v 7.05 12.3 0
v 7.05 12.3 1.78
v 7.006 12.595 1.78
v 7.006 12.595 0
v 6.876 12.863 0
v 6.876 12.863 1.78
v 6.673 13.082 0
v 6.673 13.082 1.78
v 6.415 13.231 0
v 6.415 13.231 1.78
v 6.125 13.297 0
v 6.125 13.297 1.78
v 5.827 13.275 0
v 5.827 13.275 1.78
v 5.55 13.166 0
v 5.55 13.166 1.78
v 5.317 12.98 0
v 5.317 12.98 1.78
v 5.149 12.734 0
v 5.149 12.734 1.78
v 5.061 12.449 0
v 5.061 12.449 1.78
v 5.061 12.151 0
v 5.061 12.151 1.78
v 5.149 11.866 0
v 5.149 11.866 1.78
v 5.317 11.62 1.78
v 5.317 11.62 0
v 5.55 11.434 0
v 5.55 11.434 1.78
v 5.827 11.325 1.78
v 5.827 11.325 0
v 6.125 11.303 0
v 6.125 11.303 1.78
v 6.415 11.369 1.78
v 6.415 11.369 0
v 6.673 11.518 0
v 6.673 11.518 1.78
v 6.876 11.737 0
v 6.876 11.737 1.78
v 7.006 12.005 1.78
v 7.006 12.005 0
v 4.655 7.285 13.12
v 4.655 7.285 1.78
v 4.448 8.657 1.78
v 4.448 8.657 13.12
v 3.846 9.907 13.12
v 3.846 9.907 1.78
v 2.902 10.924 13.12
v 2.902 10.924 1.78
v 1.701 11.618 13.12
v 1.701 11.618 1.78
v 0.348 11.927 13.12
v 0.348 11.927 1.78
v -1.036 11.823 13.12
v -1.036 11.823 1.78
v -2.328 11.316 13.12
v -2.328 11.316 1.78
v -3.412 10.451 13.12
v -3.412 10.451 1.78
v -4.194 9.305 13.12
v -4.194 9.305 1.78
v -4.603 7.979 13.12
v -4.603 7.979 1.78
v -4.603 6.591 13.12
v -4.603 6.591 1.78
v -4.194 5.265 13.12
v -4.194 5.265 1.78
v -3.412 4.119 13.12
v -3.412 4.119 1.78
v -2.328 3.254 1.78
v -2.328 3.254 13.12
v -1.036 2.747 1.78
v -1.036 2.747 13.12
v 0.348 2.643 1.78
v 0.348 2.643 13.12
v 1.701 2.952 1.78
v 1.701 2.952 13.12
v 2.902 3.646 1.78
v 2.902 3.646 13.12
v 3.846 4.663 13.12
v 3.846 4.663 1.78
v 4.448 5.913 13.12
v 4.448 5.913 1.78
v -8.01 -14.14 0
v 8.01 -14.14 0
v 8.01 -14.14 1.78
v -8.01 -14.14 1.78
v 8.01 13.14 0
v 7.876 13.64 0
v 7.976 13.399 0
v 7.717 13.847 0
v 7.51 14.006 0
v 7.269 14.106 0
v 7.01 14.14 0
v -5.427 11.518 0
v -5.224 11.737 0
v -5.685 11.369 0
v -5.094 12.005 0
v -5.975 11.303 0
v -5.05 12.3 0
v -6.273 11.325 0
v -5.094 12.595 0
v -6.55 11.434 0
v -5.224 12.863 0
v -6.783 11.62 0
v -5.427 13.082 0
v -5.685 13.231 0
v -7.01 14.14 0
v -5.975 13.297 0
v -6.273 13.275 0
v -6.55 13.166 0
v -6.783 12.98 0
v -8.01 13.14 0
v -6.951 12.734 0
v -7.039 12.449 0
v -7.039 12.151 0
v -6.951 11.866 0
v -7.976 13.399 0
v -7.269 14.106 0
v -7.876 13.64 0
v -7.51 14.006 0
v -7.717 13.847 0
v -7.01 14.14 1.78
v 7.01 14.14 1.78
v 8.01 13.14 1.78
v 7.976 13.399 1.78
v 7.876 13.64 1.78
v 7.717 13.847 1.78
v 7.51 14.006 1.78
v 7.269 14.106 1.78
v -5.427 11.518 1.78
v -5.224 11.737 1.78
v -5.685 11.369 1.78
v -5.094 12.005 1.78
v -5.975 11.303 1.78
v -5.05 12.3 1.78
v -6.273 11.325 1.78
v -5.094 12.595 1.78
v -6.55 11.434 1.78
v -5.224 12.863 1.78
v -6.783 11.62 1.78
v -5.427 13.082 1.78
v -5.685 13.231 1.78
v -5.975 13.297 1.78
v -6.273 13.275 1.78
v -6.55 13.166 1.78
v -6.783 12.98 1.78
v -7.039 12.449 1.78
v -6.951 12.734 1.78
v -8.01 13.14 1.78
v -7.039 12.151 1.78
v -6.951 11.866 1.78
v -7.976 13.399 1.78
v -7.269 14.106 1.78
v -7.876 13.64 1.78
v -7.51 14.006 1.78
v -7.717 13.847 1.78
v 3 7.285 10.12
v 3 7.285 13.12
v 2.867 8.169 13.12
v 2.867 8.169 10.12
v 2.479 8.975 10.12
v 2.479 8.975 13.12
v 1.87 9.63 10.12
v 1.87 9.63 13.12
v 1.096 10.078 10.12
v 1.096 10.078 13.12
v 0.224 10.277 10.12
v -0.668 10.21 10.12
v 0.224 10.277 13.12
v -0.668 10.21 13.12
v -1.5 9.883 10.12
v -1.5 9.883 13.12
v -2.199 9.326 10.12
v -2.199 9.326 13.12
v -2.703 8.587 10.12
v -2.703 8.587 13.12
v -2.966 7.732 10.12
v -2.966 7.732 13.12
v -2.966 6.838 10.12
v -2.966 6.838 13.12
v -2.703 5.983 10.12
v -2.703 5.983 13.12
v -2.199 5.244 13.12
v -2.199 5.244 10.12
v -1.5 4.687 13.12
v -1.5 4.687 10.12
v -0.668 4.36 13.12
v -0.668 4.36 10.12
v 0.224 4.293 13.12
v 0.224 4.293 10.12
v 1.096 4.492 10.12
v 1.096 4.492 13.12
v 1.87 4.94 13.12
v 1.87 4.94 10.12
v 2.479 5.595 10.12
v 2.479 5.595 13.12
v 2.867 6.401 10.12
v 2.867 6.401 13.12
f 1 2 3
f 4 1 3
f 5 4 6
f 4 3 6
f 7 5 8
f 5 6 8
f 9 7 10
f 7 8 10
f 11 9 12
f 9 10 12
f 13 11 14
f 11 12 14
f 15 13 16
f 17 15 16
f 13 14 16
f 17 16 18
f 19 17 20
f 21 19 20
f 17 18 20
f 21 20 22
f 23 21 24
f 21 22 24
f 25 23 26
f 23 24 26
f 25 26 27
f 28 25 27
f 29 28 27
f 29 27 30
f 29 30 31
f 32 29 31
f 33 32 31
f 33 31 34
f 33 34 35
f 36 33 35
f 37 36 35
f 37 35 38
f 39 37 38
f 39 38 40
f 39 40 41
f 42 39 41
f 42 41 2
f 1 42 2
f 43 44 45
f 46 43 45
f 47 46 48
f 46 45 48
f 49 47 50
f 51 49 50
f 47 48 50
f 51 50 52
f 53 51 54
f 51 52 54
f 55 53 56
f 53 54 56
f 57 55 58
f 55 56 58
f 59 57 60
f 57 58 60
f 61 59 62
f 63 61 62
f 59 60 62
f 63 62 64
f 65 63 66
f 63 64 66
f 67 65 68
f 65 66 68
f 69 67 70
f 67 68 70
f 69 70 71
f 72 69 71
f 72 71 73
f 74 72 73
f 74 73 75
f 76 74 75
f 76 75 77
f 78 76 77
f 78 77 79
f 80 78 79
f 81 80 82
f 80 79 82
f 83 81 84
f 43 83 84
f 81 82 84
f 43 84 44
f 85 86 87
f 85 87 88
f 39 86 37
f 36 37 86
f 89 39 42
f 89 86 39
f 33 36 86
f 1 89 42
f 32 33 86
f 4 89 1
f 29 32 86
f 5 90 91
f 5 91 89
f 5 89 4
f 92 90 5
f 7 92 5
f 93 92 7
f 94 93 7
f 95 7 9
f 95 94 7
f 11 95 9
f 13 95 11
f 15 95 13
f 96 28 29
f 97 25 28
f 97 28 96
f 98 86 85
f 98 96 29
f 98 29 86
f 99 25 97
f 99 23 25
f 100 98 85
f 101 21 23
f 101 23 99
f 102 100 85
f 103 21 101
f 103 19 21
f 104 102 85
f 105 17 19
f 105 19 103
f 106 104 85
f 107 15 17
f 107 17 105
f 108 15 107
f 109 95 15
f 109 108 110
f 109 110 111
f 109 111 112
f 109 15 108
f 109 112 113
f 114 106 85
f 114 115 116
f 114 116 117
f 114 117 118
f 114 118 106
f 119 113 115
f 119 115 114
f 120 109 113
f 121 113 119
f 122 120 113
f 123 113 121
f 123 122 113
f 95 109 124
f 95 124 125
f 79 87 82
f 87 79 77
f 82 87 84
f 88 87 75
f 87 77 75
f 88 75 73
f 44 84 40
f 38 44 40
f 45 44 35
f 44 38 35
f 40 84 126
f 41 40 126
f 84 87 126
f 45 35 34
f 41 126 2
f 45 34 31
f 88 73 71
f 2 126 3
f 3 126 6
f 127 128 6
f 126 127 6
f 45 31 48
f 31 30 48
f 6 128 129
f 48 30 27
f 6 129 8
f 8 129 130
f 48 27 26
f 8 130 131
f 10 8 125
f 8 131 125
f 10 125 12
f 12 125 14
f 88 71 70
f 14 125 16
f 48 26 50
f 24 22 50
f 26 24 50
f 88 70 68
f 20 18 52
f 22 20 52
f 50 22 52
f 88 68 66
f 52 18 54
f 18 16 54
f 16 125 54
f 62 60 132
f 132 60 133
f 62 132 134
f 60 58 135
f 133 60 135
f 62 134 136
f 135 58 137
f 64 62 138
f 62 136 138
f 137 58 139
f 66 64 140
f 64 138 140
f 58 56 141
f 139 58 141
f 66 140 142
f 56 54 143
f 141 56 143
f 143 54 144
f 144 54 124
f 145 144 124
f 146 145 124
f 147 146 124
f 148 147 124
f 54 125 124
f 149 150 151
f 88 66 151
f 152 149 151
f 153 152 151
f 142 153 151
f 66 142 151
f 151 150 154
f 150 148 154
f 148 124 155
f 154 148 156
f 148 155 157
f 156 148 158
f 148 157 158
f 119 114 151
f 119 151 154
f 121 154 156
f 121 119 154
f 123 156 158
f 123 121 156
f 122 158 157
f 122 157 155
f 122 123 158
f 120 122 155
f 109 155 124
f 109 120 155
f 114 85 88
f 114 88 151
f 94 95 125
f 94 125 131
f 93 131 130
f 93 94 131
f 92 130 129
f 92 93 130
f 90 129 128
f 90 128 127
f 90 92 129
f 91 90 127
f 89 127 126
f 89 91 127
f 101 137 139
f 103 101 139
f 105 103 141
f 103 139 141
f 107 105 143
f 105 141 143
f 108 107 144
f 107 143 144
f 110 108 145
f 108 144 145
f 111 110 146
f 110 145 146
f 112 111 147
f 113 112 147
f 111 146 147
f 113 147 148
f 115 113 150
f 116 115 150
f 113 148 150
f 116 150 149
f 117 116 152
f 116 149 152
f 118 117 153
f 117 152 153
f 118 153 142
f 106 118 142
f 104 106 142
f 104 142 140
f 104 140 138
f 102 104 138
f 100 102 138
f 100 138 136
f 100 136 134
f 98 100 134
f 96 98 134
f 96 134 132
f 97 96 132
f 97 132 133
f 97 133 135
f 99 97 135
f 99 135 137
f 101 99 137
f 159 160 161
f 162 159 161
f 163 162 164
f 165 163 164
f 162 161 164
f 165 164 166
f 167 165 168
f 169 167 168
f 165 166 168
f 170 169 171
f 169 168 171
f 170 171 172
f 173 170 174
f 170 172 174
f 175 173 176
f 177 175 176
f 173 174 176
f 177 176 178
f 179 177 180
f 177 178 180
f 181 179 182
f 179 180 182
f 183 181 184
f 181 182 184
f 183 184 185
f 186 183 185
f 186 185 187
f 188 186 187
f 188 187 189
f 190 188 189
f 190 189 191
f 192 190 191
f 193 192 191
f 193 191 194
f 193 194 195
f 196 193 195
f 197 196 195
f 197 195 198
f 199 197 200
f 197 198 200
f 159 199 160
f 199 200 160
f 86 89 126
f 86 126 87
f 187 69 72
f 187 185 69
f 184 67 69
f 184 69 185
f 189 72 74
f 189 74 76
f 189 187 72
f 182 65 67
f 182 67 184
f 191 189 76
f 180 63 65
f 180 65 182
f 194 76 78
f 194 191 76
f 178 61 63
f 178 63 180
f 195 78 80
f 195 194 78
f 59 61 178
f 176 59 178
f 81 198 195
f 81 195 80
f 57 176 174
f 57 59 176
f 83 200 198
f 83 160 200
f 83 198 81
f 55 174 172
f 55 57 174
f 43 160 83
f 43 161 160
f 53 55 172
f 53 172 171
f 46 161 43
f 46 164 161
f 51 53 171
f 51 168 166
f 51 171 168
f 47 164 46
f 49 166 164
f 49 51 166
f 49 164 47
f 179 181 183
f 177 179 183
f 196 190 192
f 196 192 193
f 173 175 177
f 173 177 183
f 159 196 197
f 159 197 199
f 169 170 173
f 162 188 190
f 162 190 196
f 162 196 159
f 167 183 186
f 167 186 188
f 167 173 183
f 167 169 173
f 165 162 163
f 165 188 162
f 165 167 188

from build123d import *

# Parameters (mm, degrees)
BOSS_EXTRUDE1_DEPTH = 1.78
SKETCH2_R           = 4.655
BOSS_EXTRUDE2_DEPTH = 11.34
SKETCH3_R           = 3
CUT_EXTRUDE1_DEPTH  = 3
SKETCH4_R           = 1
CUT_EXTRUDE2_DEPTH  = 3


with BuildPart() as part:
    # Sketch1 → Boss-Extrude1 (new body)
    with BuildSketch(Plane.XY):
        with BuildLine():
            Line((8.01, -14.14), (-8.01, -14.14))
            Line((-8.01, -14.14), (-8.01, 13.14))
            ThreePointArc((-8.01, 13.14), (-7.717106781, 13.847106781), (-7.01, 14.14))
            Line((-7.01, 14.14), (7.01, 14.14))
            ThreePointArc((7.01, 14.14), (7.717106781, 13.847106781), (8.01, 13.14))
            Line((8.01, 13.14), (8.01, -14.14))
        make_face()
    extrude(amount=BOSS_EXTRUDE1_DEPTH)

    # Sketch2 → Boss-Extrude2 (add)
    with BuildSketch(Plane.XY.offset(1.78)):
        with Locations((0, 7.285)):
            Circle(SKETCH2_R)
    extrude(amount=BOSS_EXTRUDE2_DEPTH)

    # Sketch3 → Cut-Extrude1 (cut)
    with BuildSketch(Plane.XY.offset(13.12)):
        with Locations((0, 7.285)):
            Circle(SKETCH3_R)
    extrude(amount=-CUT_EXTRUDE1_DEPTH, mode=Mode.SUBTRACT)

    # Sketch4 → Cut-Extrude2 (cut)
    with BuildSketch(Plane.XY.offset(1.78)):
        with Locations((6.05, 12.299860012)):
            Circle(SKETCH4_R)
        with Locations((-6.05, 12.299860012)):
            Circle(SKETCH4_R)
    extrude(amount=-CUT_EXTRUDE2_DEPTH, mode=Mode.SUBTRACT)


solid = part.part
